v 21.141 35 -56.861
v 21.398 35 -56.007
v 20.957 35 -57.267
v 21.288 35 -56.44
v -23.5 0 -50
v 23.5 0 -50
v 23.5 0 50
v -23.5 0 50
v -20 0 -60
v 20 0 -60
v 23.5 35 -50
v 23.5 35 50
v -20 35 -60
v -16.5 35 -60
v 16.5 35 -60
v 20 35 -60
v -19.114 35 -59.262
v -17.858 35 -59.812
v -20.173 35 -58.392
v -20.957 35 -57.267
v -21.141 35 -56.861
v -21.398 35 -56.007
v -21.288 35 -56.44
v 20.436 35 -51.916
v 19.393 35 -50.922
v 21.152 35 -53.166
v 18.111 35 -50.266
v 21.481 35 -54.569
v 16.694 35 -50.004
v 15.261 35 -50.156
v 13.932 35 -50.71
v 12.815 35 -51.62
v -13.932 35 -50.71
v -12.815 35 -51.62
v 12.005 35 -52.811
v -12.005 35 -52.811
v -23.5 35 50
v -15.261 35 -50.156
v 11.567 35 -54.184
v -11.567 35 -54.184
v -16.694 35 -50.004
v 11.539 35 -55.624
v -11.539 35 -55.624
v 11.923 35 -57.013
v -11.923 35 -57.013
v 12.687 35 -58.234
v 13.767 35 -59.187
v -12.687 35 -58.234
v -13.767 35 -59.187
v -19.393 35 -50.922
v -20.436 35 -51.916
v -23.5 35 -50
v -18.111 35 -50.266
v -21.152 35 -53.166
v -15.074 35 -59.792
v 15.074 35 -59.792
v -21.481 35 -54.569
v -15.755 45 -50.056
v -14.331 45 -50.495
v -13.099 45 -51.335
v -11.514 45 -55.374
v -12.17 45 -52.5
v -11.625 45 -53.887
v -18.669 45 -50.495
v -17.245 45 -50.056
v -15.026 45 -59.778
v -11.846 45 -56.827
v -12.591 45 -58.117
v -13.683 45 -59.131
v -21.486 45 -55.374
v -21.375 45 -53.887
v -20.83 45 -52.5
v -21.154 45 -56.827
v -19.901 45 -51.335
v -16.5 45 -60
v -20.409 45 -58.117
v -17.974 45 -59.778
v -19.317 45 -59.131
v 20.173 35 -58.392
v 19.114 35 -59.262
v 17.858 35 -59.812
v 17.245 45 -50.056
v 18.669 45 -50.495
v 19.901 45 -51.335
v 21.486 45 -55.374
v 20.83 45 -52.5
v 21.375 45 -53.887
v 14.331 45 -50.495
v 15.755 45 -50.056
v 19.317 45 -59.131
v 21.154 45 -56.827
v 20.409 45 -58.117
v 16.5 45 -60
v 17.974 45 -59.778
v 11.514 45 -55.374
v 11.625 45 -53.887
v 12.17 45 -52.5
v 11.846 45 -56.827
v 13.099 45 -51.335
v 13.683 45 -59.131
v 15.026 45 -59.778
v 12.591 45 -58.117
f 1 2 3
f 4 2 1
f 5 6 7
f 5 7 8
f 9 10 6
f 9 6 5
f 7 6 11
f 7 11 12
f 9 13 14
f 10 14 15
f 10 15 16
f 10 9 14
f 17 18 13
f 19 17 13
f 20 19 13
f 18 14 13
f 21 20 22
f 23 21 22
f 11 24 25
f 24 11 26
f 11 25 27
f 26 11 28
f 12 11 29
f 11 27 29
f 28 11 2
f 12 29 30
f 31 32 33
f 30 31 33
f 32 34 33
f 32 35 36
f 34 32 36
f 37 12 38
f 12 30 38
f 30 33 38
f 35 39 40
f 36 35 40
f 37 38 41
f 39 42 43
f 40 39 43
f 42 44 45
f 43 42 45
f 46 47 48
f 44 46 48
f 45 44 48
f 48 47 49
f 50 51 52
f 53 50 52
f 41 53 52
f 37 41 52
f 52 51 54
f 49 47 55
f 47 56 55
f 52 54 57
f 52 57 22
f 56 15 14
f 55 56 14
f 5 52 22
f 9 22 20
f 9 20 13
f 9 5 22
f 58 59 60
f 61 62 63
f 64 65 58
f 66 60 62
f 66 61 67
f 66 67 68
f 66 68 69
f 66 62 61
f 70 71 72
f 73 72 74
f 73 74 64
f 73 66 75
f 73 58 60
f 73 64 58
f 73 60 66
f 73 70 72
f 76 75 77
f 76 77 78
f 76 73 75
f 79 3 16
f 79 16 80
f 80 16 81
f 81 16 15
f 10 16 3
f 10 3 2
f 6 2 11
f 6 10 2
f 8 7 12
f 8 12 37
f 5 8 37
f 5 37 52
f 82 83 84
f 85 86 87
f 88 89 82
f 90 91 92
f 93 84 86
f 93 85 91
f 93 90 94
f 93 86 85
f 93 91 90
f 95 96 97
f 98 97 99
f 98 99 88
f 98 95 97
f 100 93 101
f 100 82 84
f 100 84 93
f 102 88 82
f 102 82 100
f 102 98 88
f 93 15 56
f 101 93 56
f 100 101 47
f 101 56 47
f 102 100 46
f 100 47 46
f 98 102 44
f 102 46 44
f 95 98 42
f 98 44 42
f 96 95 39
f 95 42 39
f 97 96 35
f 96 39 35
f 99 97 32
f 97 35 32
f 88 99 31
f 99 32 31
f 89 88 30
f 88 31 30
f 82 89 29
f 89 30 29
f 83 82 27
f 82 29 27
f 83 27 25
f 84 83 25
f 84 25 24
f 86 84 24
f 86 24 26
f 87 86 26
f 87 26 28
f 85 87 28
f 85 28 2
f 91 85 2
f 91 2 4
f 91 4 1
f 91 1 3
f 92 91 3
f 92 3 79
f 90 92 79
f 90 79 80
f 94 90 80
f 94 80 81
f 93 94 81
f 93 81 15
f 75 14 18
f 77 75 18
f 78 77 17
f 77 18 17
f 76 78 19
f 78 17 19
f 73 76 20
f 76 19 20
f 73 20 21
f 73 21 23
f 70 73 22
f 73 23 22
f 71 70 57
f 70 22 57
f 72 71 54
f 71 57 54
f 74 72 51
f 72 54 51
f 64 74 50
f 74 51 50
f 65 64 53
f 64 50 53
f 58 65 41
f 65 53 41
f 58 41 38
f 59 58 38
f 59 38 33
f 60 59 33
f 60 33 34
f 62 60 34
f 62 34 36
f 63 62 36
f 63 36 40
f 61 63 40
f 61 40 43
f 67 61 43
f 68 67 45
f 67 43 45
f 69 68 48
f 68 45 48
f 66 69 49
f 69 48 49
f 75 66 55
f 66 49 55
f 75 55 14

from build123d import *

# Parameters (mm, degrees)
EXTRUDE_1_DEPTH = 35
SKETCH_2_R      = 5
EXTRUDE_2_DEPTH = 10


with BuildPart() as part:
    # 草图1 → 凸台-拉伸1 (new body)
    with BuildSketch(Plane(origin=(0, 0, 0), x_dir=(1, 0, 0), z_dir=(0, 1, 0))):
        Polygon((-23.5, 50), (-20, 60), (20, 60), (23.5, 50), (23.5, -50), (-23.5, -50), align=None)
    extrude(amount=EXTRUDE_1_DEPTH)

    # 草图2 → 凸台-拉伸2 (add)
    with BuildSketch(Plane(origin=(0, 35, 0), x_dir=(1, 0, 0), z_dir=(0, 1, 0))):
        with Locations(Location((-16.5, 55, 0), (0, 0, 90))):
            Circle(SKETCH_2_R)
        with Locations(Location((16.5, 55, 0), (0, 0, 90))):
            Circle(SKETCH_2_R)
    extrude(amount=EXTRUDE_2_DEPTH)


solid = part.part
